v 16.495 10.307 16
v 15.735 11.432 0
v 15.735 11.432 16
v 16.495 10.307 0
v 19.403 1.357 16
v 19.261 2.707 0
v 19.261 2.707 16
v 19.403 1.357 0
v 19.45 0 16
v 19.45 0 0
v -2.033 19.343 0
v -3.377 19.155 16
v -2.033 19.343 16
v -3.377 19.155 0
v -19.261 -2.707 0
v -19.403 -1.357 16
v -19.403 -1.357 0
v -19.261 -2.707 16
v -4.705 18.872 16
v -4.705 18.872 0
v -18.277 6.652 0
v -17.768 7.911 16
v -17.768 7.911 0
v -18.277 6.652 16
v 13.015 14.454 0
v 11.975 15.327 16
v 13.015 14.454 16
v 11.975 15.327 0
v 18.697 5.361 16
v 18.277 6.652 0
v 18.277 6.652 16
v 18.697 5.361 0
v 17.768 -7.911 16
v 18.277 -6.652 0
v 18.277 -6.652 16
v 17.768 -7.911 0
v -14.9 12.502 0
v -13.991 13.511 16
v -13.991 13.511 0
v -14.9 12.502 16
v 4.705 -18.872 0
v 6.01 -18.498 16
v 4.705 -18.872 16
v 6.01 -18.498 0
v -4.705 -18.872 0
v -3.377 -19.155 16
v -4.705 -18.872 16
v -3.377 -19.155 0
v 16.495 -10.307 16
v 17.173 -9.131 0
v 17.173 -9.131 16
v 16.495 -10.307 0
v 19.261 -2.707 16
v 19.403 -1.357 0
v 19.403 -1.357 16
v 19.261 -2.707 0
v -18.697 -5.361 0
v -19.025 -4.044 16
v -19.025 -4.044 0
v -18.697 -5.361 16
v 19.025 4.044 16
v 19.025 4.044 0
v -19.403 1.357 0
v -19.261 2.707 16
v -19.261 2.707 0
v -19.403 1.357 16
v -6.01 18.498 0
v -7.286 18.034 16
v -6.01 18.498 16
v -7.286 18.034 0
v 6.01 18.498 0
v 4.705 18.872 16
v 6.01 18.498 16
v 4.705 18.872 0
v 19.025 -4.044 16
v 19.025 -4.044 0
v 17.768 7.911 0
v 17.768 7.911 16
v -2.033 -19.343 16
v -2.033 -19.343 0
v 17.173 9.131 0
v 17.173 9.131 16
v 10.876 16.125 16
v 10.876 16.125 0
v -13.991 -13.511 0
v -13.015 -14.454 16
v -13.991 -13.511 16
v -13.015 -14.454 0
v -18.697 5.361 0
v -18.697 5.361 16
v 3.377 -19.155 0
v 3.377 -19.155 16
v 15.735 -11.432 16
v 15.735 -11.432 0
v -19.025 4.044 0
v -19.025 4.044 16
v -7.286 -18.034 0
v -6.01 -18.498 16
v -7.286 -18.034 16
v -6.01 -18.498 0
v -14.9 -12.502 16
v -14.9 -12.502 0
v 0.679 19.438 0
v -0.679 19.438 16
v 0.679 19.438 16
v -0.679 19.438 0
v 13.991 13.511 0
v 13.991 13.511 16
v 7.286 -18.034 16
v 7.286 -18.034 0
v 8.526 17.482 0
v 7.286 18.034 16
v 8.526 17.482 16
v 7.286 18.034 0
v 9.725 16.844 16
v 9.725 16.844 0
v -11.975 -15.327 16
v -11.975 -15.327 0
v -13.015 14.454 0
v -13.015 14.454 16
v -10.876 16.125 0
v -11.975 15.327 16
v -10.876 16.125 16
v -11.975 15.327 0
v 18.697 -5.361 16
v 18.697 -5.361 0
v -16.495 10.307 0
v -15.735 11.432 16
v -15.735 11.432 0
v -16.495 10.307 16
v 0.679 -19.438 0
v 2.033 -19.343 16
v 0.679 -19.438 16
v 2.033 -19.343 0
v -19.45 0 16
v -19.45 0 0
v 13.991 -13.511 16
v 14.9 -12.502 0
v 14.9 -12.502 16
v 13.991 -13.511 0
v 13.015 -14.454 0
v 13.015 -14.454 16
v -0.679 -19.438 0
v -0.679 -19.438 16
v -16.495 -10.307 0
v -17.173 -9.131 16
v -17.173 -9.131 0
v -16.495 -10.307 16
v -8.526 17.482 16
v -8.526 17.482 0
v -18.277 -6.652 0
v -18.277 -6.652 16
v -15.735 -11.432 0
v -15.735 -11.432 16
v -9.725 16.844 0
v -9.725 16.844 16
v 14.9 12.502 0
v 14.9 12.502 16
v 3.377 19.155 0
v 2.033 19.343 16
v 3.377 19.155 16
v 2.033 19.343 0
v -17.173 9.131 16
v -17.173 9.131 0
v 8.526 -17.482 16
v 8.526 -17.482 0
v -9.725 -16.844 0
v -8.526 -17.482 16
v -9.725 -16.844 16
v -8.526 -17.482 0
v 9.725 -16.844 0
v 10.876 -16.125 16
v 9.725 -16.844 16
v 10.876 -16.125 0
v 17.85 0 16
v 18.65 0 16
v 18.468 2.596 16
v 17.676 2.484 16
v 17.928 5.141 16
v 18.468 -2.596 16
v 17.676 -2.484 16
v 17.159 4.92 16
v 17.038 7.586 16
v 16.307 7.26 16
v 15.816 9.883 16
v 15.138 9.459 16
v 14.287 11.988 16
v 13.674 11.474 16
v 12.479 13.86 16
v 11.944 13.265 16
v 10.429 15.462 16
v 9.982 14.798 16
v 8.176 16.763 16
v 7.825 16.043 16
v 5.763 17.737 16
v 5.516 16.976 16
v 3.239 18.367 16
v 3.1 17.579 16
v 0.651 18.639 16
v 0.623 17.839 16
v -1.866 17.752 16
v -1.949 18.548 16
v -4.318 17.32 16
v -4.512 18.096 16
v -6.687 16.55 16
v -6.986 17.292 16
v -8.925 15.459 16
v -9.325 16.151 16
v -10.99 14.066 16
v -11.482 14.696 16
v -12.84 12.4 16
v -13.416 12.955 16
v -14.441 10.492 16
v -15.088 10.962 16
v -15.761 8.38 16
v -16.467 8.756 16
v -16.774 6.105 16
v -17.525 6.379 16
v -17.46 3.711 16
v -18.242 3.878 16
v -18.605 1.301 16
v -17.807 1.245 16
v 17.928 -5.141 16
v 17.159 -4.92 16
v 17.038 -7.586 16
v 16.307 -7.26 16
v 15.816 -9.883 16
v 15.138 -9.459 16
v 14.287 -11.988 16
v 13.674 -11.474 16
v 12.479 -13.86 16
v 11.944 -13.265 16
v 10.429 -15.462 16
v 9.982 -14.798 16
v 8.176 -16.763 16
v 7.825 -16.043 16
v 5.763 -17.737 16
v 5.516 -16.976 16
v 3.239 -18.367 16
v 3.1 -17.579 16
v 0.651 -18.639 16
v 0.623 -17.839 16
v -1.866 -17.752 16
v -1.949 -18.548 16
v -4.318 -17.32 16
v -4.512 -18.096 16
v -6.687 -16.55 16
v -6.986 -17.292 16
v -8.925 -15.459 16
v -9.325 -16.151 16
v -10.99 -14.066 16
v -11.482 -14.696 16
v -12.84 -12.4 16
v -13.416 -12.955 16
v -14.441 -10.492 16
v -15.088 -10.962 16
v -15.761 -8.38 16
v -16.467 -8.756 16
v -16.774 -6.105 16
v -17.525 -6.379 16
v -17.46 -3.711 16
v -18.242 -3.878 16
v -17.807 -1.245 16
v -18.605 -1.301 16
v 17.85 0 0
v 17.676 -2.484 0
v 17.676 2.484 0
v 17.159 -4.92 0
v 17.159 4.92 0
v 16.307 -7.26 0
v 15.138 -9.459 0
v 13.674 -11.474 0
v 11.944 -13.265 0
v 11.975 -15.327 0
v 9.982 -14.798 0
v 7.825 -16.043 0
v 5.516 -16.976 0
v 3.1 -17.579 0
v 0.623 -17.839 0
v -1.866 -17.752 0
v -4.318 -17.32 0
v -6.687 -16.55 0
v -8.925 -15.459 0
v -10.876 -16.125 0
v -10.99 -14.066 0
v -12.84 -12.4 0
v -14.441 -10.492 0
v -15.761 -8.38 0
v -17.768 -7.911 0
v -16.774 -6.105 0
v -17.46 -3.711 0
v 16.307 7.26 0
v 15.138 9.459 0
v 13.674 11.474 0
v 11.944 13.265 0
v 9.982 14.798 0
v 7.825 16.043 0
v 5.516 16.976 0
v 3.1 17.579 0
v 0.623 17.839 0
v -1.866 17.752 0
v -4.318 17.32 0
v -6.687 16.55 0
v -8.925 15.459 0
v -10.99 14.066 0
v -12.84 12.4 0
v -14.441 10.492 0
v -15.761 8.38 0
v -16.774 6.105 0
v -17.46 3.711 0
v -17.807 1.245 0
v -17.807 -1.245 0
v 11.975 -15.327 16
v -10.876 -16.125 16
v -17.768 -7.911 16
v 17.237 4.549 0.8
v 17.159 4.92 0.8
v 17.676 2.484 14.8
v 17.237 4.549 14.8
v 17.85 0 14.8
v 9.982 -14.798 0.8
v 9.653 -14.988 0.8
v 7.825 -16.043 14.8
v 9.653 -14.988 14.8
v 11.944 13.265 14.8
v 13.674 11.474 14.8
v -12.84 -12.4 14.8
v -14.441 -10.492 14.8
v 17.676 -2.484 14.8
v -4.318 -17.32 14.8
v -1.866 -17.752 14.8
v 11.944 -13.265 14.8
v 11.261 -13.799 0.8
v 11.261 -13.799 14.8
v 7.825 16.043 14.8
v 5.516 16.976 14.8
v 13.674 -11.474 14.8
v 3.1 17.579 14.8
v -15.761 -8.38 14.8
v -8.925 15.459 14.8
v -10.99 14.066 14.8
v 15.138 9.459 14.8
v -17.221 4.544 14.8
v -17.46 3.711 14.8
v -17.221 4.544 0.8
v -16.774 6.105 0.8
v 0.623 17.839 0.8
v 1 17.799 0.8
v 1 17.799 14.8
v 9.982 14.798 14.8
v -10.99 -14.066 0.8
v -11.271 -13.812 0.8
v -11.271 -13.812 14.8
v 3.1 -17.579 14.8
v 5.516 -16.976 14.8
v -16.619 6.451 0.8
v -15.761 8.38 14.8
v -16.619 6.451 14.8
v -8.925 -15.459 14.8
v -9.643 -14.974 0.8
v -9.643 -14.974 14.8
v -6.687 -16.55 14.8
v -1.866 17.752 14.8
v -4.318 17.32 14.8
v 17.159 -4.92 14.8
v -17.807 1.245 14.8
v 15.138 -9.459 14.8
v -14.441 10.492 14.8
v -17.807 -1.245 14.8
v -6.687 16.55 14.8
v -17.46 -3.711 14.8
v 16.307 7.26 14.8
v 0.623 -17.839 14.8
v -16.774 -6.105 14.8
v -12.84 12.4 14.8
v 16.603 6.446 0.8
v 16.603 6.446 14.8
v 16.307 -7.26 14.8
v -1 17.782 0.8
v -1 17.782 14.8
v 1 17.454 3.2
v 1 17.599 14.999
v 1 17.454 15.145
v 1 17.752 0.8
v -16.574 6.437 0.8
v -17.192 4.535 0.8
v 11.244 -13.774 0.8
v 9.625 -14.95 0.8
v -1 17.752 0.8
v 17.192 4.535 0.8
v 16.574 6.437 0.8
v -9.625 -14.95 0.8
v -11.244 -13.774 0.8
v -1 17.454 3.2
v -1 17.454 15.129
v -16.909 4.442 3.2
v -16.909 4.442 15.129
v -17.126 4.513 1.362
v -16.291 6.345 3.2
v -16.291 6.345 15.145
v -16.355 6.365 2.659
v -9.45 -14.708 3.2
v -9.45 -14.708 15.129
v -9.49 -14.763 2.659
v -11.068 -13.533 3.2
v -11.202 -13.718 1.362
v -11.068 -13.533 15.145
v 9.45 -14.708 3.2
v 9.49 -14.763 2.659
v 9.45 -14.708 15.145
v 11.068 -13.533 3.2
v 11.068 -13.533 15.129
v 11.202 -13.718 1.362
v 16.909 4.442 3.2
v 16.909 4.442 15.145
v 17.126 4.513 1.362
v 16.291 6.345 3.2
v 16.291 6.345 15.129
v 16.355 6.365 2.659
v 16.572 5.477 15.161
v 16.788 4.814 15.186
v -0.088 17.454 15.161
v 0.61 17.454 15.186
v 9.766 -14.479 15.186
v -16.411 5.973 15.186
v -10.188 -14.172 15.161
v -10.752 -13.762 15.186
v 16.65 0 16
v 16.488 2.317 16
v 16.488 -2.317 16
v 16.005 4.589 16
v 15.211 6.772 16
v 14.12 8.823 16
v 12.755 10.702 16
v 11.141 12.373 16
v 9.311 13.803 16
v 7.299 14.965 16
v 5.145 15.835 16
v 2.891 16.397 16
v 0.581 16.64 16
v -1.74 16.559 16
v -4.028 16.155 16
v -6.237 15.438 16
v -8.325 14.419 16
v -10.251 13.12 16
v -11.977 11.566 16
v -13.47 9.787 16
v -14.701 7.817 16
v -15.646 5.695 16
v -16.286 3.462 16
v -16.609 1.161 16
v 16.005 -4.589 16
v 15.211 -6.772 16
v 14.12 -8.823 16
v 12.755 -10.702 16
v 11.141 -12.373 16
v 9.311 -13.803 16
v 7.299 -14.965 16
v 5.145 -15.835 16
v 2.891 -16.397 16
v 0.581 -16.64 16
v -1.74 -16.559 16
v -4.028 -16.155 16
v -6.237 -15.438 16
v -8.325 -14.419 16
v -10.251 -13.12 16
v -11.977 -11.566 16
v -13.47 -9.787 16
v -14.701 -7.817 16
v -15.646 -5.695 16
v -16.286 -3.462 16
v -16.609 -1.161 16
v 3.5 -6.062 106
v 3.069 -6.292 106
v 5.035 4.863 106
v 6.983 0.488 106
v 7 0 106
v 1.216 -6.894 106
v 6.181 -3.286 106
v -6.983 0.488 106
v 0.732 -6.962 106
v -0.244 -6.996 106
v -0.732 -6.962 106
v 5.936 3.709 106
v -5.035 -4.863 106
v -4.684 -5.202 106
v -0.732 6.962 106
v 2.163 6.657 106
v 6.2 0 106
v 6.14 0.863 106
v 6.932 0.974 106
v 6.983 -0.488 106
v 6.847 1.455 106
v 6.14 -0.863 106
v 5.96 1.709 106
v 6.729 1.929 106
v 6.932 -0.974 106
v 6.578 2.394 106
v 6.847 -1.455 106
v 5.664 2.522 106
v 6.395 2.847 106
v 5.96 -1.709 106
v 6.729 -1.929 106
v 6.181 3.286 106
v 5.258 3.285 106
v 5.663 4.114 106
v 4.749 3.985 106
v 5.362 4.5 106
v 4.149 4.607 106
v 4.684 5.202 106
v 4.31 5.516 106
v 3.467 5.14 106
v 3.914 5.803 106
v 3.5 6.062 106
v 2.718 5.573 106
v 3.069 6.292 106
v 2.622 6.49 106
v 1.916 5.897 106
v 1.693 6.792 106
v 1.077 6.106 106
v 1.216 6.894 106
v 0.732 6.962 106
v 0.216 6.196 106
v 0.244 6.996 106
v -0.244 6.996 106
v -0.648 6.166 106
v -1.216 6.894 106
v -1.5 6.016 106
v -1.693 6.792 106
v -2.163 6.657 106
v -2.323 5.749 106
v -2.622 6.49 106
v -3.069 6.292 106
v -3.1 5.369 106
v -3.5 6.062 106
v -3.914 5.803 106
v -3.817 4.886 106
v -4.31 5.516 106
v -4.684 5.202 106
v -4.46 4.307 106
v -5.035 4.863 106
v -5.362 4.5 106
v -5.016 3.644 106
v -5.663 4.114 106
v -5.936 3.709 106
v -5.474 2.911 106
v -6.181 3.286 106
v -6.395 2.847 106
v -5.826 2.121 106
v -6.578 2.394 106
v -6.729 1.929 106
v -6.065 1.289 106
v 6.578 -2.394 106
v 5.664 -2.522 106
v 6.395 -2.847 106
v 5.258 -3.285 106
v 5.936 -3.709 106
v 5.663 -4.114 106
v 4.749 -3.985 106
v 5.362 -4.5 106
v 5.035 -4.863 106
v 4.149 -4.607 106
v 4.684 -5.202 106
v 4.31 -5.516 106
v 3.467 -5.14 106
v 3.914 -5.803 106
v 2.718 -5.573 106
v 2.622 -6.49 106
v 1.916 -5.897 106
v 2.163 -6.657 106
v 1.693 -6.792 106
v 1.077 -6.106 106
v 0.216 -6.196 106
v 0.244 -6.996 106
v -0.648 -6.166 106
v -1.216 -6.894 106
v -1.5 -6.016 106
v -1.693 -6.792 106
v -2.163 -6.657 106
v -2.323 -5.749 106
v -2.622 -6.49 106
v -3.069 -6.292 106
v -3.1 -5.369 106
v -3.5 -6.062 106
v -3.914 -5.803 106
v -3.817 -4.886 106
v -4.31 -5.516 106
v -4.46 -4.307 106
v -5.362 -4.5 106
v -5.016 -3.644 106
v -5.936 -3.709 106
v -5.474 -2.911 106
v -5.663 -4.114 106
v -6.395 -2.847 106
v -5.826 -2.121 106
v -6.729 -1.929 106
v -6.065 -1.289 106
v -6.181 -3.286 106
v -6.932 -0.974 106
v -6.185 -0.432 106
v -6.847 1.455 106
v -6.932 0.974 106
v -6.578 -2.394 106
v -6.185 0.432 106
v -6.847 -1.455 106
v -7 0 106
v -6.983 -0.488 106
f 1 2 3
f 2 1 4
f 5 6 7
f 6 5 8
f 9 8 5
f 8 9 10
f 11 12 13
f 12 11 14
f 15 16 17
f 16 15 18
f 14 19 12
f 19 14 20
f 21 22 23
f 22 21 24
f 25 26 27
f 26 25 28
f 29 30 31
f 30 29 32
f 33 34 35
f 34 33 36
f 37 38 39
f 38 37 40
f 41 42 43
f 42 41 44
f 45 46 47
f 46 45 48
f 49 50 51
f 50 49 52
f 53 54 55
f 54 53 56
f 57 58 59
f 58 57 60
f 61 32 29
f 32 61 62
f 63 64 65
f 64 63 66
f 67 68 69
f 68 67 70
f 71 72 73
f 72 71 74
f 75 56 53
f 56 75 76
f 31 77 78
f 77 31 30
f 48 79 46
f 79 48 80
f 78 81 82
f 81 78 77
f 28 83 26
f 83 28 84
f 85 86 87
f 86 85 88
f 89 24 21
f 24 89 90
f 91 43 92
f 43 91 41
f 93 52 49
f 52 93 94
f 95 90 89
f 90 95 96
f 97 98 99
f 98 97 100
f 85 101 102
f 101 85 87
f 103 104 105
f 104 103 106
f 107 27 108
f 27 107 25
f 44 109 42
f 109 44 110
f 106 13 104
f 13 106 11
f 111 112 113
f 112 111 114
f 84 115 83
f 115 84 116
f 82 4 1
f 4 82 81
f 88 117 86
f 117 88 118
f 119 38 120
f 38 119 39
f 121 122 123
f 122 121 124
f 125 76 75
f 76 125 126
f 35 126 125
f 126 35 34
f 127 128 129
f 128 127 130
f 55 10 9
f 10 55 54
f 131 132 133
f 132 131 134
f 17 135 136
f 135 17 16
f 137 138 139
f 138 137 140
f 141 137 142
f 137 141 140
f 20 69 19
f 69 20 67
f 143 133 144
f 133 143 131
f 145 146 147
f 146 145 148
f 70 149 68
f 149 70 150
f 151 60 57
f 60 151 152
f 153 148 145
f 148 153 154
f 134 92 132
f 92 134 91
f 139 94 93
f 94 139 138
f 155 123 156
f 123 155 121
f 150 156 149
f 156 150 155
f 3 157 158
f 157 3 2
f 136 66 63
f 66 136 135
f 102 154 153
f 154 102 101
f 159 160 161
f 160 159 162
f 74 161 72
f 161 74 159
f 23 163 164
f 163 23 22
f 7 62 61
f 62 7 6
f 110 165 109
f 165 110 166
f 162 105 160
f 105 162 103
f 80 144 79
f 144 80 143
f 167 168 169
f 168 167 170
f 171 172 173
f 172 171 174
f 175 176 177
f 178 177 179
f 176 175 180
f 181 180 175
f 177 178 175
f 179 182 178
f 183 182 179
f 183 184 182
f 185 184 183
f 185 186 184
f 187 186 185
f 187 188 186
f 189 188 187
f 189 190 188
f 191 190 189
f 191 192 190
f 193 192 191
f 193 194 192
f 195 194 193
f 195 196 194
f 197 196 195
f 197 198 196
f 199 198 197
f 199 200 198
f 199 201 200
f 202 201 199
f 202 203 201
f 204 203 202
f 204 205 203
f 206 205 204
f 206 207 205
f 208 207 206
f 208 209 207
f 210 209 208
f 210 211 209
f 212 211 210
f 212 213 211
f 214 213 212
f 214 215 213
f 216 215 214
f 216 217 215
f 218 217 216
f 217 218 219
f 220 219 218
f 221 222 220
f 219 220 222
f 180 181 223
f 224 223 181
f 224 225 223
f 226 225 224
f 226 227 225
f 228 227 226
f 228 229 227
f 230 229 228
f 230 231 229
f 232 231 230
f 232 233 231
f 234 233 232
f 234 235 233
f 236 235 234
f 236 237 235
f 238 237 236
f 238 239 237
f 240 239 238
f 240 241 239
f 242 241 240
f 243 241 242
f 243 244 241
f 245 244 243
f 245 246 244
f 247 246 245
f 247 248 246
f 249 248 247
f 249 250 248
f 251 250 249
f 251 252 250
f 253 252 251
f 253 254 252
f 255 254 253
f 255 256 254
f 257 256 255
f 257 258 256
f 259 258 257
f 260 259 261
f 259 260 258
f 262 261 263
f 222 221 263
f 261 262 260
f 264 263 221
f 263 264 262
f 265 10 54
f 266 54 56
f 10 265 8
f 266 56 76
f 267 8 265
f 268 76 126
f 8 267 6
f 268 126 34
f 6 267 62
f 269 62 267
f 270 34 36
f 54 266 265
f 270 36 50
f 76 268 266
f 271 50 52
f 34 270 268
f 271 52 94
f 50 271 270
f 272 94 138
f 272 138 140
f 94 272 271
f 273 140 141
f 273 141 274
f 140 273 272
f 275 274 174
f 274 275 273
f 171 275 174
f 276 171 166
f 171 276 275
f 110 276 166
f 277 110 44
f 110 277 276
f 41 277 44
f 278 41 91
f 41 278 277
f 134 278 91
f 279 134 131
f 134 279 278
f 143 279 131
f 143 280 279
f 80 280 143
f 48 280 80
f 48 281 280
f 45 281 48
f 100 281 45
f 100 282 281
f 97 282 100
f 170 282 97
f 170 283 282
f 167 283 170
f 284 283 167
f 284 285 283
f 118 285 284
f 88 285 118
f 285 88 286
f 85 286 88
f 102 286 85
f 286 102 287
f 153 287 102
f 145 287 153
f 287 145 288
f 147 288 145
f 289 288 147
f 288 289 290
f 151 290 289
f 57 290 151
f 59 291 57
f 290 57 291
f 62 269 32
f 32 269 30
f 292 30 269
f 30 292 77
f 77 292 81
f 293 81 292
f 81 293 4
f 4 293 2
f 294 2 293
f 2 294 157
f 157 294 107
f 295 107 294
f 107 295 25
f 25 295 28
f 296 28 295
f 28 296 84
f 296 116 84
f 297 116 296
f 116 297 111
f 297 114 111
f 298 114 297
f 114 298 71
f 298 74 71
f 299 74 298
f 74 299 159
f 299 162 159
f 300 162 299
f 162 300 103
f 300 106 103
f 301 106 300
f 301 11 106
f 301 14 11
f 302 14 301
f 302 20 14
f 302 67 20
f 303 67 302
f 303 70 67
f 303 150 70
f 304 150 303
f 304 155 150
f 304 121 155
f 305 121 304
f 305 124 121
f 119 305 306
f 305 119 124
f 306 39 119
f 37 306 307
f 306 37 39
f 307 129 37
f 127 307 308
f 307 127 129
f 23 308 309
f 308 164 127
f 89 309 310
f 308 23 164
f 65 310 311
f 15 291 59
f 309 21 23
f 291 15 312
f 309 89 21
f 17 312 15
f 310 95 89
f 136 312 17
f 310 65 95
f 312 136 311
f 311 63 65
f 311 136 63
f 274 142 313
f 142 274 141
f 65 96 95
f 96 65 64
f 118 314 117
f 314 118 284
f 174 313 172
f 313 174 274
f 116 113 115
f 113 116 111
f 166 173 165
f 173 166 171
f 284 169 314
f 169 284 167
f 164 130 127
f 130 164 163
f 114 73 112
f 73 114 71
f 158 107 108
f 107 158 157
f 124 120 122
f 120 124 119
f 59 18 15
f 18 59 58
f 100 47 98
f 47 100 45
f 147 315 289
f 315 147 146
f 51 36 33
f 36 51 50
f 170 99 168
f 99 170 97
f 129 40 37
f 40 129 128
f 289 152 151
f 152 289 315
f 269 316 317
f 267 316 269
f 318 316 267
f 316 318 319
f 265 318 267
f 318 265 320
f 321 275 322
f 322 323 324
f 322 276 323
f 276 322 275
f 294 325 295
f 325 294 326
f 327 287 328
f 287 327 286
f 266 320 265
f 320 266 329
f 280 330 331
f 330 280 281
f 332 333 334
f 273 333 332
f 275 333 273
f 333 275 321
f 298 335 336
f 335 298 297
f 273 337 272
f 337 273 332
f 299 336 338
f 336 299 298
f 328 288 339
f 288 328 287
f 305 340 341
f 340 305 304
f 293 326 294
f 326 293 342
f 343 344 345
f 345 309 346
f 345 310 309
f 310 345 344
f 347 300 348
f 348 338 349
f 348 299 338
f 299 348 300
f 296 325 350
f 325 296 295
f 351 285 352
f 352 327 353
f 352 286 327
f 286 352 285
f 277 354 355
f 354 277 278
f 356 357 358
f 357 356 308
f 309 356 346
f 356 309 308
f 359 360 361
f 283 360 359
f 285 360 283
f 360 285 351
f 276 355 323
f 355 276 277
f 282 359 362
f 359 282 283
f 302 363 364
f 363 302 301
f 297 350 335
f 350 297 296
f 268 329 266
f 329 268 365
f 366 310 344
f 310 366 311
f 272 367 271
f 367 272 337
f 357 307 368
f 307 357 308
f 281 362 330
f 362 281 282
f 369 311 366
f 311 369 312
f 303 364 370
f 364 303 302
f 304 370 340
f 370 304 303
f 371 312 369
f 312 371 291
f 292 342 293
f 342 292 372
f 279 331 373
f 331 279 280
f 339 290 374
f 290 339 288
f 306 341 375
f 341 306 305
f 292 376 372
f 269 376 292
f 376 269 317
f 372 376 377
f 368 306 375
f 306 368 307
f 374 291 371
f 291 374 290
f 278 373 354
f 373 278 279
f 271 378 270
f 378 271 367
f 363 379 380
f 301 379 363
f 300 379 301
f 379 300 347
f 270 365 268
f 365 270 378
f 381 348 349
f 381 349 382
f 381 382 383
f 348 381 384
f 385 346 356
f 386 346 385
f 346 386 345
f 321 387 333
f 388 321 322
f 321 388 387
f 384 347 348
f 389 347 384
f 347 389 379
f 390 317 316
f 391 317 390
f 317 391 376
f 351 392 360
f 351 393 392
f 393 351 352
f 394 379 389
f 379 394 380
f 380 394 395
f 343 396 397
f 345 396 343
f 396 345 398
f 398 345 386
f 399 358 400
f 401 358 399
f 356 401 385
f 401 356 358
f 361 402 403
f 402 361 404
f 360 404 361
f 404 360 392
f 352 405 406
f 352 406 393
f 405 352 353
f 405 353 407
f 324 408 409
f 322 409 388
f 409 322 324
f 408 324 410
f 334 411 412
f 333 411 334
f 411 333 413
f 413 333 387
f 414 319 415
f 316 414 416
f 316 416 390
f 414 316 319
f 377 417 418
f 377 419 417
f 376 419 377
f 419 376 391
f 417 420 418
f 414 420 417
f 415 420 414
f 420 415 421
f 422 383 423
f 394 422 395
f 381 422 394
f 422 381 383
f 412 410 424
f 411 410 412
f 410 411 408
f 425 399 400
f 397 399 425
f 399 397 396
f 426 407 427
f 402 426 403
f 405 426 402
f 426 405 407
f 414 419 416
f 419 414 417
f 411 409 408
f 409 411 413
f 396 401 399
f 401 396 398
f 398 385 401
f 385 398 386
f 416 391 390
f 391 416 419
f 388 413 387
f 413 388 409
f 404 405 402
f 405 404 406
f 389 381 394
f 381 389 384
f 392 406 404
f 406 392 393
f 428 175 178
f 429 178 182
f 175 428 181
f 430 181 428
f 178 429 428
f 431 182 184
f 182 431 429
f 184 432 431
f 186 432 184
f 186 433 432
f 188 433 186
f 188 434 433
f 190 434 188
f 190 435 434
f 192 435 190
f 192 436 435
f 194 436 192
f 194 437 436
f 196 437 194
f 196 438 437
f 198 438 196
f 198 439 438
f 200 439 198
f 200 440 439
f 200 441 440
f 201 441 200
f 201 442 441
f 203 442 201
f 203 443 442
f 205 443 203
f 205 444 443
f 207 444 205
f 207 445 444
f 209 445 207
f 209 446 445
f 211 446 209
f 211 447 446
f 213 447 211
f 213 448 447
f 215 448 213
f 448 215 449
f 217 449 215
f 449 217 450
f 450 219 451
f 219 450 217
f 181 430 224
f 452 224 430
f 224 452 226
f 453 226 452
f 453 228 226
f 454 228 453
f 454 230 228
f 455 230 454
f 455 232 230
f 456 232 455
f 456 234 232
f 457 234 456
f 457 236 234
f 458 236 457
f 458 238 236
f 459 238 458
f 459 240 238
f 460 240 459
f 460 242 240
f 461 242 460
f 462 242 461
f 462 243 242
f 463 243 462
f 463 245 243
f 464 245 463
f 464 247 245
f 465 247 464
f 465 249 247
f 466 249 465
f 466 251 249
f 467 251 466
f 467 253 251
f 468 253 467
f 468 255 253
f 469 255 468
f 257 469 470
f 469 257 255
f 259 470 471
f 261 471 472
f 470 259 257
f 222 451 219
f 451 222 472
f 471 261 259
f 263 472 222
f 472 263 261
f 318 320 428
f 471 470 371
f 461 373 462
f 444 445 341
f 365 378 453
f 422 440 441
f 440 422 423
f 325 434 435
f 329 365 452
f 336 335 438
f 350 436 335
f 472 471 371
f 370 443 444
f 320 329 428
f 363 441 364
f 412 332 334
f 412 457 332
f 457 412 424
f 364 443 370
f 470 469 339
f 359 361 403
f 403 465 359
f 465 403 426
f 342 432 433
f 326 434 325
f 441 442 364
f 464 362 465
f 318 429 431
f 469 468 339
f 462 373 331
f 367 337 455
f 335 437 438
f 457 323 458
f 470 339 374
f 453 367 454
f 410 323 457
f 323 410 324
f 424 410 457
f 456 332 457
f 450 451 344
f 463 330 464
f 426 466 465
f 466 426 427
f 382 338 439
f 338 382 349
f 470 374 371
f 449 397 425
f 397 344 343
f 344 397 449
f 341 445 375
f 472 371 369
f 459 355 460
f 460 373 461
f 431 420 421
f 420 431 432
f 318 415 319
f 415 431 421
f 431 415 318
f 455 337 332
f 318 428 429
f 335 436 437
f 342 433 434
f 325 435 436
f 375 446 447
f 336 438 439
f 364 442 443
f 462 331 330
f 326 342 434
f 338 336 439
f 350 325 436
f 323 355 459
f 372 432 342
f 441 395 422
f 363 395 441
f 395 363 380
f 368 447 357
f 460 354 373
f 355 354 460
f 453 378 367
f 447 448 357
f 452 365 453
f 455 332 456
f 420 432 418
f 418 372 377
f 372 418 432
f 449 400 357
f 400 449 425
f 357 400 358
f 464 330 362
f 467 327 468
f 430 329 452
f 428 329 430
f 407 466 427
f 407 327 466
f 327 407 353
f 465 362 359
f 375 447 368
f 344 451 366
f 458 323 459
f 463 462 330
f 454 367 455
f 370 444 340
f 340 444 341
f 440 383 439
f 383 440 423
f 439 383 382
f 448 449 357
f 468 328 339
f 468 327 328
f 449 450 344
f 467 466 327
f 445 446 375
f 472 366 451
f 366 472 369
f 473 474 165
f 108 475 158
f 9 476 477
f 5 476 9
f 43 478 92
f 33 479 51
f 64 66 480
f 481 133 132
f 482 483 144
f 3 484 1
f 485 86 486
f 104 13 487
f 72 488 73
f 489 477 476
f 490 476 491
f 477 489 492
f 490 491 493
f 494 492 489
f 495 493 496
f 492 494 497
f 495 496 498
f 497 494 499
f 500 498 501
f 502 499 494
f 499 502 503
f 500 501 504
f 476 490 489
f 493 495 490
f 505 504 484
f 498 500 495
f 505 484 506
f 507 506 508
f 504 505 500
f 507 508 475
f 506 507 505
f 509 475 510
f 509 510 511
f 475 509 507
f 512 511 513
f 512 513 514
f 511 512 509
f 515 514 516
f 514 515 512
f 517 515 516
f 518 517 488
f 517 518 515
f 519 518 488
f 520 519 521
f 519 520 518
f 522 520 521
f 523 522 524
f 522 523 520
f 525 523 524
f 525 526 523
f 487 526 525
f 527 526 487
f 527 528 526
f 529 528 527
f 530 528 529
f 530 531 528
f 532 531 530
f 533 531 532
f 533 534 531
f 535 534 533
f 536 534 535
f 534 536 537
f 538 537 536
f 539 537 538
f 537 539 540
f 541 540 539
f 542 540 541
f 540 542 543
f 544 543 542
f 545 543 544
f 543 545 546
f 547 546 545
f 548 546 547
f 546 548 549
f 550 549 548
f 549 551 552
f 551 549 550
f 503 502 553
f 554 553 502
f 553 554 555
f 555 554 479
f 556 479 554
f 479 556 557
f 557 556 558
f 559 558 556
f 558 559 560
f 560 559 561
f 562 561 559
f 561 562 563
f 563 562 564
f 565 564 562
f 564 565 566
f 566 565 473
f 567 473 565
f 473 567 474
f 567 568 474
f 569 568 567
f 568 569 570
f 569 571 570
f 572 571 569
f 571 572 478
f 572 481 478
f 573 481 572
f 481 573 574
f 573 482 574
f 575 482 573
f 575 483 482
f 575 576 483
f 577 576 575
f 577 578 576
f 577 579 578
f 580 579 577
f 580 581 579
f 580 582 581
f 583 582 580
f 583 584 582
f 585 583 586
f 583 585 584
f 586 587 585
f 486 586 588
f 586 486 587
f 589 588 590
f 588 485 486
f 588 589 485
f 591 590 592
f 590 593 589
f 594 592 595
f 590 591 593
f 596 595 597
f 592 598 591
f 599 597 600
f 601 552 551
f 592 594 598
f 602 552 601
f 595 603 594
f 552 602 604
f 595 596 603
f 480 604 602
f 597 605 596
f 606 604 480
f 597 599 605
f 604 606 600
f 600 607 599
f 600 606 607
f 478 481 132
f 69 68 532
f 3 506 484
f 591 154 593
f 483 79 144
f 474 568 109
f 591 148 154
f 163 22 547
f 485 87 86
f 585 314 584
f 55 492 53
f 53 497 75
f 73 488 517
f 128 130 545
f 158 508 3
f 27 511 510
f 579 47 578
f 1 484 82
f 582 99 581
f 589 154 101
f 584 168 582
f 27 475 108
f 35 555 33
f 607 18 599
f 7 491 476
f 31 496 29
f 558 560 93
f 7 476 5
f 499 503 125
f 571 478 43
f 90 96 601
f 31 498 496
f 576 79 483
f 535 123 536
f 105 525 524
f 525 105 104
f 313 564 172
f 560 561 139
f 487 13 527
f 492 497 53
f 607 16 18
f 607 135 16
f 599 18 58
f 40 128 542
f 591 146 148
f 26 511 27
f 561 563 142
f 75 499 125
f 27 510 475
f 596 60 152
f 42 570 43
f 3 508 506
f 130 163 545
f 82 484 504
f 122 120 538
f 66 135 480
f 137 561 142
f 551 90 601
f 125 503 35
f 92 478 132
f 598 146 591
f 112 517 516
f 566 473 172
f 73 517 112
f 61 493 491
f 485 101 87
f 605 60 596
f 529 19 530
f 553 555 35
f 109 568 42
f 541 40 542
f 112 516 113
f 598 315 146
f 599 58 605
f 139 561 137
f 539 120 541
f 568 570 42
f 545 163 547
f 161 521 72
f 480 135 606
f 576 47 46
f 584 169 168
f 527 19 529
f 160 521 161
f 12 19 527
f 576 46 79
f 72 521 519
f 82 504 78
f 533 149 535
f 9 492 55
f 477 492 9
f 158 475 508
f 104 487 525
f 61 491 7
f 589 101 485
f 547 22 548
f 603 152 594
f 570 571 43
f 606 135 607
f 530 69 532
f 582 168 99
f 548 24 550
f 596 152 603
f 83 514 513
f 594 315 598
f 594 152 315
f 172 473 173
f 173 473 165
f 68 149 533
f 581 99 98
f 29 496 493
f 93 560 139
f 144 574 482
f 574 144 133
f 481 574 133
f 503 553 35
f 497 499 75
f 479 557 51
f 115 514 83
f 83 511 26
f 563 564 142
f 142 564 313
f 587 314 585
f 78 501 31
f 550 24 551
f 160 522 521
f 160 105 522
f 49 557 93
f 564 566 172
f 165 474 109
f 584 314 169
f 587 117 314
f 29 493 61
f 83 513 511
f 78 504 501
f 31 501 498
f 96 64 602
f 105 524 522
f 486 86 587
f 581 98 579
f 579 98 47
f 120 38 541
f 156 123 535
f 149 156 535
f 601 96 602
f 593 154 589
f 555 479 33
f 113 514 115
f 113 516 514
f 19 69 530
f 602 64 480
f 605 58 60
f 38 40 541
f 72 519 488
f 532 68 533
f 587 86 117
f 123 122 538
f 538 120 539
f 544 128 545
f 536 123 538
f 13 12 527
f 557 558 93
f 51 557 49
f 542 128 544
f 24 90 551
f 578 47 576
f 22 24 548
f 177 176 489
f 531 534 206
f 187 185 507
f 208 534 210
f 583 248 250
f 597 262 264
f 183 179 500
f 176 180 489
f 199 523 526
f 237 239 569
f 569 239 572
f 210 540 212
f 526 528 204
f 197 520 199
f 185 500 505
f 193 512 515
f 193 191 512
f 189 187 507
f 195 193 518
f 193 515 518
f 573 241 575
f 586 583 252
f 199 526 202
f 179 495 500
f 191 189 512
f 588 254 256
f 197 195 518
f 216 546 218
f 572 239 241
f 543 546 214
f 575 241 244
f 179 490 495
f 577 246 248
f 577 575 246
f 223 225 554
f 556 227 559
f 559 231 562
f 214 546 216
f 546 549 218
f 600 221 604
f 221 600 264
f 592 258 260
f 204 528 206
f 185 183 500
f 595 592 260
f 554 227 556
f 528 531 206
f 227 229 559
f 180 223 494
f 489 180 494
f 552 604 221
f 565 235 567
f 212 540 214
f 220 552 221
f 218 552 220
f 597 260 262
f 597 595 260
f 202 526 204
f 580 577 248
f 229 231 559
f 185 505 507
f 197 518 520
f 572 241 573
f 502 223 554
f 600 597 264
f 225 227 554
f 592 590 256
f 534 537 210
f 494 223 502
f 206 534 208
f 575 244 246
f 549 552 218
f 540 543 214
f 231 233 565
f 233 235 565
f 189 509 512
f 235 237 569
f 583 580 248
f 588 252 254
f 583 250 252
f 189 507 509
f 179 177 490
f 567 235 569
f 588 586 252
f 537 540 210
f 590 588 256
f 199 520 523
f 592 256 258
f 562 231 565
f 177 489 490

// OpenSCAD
/*  Pocket flashlight hi-visibility cone.
    For best effect, print in translucent orange material.

    Copyright (C) 2012  Peter-Paul van Gemerden <pp@van.gemerden.nl>

    This program is free software: you can redistribute it and/or modify
    it under the terms of the GNU General Public License as published by
    the Free Software Foundation, either version 3 of the License, or
    (at your option) any later version.

    This program is distributed in the hope that it will be useful,
    but WITHOUT ANY WARRANTY; without even the implied warranty of
    MERCHANTABILITY or FITNESS FOR A PARTICULAR PURPOSE.  See the
    GNU General Public License for more details.

    You should have received a copy of the GNU General Public License
    along with this program.  If not, see <http://www.gnu.org/licenses/>.*/


/** Settings **/

test = false;
    // generates just a small ring
    // to test with flashlight diameter

head_diameter = 34.5;
base_height = 16;
base_wall = 1.6;

cone_height = 90;
cone_wall = 0.8;
cone_tip_diameter = 14;

closed_tip = false;

gaps = false;
    // mimic the shape of my flashlight;
    // disable if they annoy you or
    // influence printing quality


/** More settings **/

xy_space = 0.6; // extra room on the inside of the base

num_grips = 5;
grip_height = 0.3;
grip_width = 2;
grip_slope = 0.15 * base_height;
grip_runup = 0.05 * base_height;

num_gaps = 5;
gap_radius = 10;
gap_height = 3;

ridge = 1.2; // the ridge keeps the flashlight from overshooting the base


/****    (End of settings)      *****/


/** Runtime variables **/

// (You shouldn't need to change these)

base_inner_radius = head_diameter/2 + xy_space;
base_outer_radius = base_inner_radius + base_wall;
grip_cutout_radius = base_inner_radius - grip_height;
grip_rotation = 360 / num_grips;


/** Code **/

if (test) {
	scale([1, 1, 0.5])
	base();
} else {
	union() {
		base();
		translate([0, 0, base_height])
		cone();
	}
}


/** Modules **/

module base() {
	union() {
		base_wall();
		base_grips();
		if (!test) {
			translate([0, 0, base_height - ridge])
			base_ridge();
		}
	}
}

module base_wall() {	
	difference() {
		cylinder(h=base_height, r=base_outer_radius, $fn=90);
		cylinder(h=base_height, r=base_inner_radius, $fn=45);
		if (gaps) {
			base_gaps();
		}
	}
}

module base_gaps() {
	rotation = 360 / num_gaps;
	for (i = [0 : num_gaps]) {
		rotate([0, 0, i * rotation])
		base_gap();
	}
}

module base_gap() {
	translate([0, 0, gap_height-gap_radius])
	rotate([90, 0, 0])
	cylinder(h=base_outer_radius, r=gap_radius, $fn=45);
}

module base_grips() {	
	translate([0, 0, grip_runup])
	difference() {
		base_grip_stubs();
		cylinder(h=base_height-grip_runup, r=grip_cutout_radius);
		cylinder(h=grip_slope, r1=base_inner_radius, r2=grip_cutout_radius);
	}
}

module base_grip_stubs() {
	for (i = [0 : num_grips]) {
		rotate([0, 0, i * grip_rotation])
		base_grip();
	}
}

module base_grip() {
	translate([-grip_width/2, 0, 0])
	cube([grip_width, (head_diameter/2)+xy_space, base_height-grip_runup]);
}

module base_ridge() {
	$fn = 45;
	difference() {
		cylinder(h=ridge, r=base_inner_radius);
		cylinder(h=ridge, r1=base_inner_radius, r2=base_inner_radius-ridge);
	}
}

module cone() {
	h = cone_height;
	r1 = base_outer_radius;
	r2 = cone_tip_diameter/2;
	
	h2 = closed_tip ? (h - cone_wall) : h;

	difference() {
		cylinder(h=h, r1=r1, r2=r2, $fn=90);
		cylinder(h=h2, r1=r1-cone_wall, r2=r2-cone_wall, $fn=45);
	}
}
